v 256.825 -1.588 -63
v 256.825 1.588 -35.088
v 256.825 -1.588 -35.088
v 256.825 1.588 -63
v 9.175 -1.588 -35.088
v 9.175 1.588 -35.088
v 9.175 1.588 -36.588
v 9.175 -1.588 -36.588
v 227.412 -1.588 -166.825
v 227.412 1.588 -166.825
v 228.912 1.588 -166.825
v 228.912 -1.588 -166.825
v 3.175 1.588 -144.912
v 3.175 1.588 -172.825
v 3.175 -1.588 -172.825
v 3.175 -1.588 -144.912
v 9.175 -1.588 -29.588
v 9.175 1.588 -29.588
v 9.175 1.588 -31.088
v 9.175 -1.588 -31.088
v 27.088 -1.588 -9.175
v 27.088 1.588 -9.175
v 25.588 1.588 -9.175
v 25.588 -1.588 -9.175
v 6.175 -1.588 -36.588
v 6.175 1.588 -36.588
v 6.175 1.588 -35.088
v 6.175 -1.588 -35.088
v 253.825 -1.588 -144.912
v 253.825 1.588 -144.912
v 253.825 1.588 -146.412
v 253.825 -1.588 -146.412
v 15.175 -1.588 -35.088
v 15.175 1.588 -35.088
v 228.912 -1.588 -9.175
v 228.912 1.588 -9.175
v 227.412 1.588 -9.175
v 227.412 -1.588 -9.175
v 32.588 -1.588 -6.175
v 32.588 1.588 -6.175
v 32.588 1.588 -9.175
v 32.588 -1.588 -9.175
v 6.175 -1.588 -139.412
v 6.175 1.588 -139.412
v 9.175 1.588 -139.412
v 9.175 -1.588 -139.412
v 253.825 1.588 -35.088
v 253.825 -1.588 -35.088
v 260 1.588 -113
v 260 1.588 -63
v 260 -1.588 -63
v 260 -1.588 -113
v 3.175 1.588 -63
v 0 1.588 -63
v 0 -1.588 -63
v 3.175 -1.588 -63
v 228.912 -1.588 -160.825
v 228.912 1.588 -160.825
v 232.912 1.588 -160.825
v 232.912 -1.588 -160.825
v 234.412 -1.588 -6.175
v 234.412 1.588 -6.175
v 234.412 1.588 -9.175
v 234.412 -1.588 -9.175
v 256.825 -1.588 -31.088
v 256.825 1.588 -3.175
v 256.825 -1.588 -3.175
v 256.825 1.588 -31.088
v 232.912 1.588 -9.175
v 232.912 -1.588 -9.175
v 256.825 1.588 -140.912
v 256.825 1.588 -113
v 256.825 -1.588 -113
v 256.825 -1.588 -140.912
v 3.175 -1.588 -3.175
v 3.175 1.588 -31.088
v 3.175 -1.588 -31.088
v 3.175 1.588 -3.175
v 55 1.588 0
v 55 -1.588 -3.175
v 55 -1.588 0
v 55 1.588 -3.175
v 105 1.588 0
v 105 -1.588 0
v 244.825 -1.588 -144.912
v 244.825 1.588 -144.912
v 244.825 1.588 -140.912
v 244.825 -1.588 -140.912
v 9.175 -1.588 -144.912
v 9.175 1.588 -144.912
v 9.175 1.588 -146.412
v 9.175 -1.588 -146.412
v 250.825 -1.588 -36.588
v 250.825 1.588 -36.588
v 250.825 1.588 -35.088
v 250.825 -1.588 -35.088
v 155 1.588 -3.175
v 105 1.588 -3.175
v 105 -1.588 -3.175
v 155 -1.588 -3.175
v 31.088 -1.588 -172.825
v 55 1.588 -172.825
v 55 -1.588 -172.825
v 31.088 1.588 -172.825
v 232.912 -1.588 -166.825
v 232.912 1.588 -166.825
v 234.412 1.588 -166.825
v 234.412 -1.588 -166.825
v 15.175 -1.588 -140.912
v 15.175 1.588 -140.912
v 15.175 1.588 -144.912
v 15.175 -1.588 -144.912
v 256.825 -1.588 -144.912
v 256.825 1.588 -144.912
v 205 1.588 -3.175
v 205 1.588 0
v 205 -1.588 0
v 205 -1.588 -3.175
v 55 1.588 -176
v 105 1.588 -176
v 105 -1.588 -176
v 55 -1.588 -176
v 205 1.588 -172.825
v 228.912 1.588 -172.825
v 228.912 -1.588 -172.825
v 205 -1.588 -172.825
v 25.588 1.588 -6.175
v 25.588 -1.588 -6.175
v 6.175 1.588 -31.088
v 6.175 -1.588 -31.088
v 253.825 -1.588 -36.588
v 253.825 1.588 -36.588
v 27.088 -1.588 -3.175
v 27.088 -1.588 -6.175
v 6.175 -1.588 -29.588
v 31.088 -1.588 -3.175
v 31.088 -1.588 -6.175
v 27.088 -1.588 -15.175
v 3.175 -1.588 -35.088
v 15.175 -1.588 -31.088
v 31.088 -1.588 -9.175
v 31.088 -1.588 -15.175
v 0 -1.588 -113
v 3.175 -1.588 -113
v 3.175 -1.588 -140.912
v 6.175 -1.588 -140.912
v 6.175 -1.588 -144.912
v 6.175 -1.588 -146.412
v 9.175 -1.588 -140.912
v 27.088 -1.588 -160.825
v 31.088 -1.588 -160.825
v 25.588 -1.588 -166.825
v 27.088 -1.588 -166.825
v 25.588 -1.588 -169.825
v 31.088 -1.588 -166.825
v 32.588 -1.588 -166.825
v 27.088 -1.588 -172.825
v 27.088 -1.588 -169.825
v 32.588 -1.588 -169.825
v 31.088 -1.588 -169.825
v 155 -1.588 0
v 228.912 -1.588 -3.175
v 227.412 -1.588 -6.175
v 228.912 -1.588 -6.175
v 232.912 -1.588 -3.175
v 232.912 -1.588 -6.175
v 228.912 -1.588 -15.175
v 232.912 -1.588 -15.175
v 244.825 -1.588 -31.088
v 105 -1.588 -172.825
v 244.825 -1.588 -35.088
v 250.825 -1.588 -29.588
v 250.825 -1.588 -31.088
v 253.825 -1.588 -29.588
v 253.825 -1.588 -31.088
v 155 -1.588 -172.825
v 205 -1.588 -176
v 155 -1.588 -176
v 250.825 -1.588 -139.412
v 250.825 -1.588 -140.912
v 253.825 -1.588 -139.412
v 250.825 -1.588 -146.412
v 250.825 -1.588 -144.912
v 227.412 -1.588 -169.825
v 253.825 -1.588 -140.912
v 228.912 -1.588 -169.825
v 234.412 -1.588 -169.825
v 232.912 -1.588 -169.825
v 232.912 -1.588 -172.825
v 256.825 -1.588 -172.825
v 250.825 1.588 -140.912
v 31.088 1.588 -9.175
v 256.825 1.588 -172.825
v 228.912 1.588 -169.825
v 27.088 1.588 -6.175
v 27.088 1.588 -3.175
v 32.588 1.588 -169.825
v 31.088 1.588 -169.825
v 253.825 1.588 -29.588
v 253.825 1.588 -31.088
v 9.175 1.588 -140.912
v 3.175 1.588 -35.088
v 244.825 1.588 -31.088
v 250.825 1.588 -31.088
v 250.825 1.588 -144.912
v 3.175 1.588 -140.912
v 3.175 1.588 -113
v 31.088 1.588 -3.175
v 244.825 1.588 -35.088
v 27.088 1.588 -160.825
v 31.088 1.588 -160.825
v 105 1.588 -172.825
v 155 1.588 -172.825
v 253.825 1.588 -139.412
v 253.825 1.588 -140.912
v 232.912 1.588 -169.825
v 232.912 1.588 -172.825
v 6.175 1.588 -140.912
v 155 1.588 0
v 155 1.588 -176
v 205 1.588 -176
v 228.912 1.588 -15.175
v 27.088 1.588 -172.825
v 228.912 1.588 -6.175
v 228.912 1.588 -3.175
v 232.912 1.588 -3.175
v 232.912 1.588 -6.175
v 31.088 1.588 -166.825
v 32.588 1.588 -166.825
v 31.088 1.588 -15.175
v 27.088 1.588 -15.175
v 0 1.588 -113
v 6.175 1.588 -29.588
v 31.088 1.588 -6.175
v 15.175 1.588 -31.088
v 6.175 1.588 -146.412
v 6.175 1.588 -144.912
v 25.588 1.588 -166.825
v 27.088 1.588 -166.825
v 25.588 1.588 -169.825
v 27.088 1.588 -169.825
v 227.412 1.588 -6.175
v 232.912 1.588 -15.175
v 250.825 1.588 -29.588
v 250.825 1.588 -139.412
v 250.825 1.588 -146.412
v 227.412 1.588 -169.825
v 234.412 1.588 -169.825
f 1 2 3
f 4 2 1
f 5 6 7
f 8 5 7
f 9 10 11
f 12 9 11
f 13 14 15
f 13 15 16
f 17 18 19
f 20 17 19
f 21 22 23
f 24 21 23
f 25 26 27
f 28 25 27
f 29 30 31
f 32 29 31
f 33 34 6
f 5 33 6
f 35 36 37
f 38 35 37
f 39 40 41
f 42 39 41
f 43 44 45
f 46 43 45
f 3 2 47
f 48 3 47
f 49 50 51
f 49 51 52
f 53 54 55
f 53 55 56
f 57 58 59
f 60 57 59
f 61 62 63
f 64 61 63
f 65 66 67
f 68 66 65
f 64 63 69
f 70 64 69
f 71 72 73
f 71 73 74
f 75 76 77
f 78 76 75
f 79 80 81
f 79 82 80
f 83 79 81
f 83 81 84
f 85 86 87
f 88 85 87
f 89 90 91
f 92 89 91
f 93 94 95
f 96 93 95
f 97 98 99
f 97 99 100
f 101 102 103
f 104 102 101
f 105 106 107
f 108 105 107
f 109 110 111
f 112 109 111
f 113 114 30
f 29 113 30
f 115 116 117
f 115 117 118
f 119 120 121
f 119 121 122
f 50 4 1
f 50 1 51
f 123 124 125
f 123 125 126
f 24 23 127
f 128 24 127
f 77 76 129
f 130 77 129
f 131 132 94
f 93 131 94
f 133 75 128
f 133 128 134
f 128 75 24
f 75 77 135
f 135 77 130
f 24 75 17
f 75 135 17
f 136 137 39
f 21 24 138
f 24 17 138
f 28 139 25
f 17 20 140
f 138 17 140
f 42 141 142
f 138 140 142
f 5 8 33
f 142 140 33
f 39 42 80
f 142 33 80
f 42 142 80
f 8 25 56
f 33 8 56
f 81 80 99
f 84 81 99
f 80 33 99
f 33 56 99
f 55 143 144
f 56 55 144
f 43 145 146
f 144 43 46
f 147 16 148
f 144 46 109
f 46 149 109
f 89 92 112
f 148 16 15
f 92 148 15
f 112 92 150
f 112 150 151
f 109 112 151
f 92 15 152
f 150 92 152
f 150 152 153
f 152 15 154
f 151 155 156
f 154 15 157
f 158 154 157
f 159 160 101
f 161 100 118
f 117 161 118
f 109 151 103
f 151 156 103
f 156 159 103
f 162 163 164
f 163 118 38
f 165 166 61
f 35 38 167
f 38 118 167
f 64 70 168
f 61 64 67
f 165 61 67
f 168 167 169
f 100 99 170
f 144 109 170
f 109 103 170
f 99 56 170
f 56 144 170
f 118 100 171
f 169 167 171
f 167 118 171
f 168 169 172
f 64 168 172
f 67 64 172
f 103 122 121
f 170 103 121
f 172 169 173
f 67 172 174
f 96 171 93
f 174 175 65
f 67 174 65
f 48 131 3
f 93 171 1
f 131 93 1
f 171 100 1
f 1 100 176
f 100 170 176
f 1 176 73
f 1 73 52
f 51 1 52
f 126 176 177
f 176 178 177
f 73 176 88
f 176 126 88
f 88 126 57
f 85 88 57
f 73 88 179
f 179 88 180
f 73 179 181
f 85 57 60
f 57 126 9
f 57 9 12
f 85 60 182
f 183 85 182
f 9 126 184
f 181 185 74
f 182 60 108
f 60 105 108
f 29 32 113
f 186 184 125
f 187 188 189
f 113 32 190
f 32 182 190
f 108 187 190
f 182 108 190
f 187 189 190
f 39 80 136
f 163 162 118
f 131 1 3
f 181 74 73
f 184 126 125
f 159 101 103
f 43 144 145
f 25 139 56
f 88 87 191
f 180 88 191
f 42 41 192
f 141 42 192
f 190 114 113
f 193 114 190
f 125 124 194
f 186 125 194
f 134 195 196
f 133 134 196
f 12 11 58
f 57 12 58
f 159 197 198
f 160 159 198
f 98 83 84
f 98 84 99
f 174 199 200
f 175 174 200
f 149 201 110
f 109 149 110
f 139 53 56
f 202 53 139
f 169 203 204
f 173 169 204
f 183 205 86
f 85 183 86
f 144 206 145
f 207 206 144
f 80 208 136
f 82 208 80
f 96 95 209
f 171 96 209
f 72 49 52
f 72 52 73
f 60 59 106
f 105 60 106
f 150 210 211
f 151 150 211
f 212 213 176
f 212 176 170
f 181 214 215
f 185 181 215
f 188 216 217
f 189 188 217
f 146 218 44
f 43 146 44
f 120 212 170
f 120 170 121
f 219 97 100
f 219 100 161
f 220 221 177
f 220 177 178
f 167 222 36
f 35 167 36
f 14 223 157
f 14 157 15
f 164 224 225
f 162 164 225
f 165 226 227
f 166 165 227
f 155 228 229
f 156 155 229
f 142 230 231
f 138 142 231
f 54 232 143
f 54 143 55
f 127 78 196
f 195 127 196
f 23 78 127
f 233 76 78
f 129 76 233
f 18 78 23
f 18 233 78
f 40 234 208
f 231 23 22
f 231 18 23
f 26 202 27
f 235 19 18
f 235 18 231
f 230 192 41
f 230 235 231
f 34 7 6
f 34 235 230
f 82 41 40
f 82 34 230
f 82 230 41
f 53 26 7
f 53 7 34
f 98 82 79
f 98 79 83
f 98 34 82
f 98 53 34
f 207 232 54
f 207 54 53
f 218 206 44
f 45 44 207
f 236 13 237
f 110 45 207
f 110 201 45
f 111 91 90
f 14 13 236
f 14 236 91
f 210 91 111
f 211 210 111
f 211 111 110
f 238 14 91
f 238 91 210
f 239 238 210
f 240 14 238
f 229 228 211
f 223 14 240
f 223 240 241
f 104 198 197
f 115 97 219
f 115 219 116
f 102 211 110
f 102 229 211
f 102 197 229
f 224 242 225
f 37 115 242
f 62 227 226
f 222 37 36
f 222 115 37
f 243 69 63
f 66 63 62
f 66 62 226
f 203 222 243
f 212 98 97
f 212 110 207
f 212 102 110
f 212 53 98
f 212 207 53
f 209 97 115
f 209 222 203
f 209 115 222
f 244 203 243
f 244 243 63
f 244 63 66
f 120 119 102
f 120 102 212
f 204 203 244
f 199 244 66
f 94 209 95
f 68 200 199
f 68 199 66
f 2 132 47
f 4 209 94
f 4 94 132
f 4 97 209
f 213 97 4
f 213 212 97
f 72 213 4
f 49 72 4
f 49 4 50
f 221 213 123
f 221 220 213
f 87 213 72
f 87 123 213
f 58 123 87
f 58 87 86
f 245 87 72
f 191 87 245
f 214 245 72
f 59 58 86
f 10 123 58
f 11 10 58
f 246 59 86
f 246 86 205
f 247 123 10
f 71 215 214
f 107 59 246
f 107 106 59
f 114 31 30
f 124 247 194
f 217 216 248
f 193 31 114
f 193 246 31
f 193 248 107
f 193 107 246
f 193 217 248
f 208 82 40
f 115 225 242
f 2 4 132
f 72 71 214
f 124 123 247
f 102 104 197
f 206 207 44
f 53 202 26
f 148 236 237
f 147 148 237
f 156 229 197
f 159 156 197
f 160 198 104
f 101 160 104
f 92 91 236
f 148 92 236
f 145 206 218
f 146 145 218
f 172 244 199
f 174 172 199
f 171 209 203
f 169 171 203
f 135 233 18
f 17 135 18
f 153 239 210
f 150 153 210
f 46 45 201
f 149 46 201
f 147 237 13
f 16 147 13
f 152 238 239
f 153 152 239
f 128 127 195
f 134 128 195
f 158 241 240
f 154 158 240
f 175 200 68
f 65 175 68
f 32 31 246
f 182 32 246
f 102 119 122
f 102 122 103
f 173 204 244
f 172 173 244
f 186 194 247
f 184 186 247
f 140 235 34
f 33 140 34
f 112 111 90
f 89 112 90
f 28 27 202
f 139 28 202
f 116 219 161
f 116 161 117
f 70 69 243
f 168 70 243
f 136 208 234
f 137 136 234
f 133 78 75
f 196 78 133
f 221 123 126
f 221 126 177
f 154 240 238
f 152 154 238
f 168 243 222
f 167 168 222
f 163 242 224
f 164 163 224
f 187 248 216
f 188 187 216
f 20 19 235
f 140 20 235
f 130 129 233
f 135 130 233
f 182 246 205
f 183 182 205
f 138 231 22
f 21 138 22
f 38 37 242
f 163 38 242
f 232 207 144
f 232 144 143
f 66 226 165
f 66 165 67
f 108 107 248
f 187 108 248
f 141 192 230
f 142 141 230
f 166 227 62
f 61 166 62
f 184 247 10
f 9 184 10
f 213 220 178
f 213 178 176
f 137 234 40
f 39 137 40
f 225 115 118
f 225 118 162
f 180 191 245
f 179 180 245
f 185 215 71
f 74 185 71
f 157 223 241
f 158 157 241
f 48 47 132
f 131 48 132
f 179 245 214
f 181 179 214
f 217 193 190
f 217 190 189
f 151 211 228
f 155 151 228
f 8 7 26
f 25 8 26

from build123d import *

# Parameters (mm, degrees)
BOSS_EXTRUDE1_DEPTH     = 1.5875
CUT_EXTRUDE1_DEPTH      = 1
CUT_EXTRUDE1_DEPTH_BACK = 4.175


with BuildPart() as part:
    # Sketch1 → Boss-Extrude1 (new body, symmetric)
    with BuildSketch(Plane(origin=(0, 0, 0), x_dir=(1, 0, 0), z_dir=(0, 1, 0))):
        Polygon((55, 3.175), (55, 0), (105, 0), (105, 3.175), (155, 3.175), (155, 0), (205, 0), (205, 3.175), (256.825, 3.175), (256.825, 63), (260, 63), (260, 113), (256.825, 113), (256.825, 172.825), (205, 172.825), (205, 176), (155, 176), (155, 172.825), (105, 172.825), (105, 176), (55, 176), (55, 172.825), (3.175, 172.825), (3.175, 113), (0, 113), (0, 63), (3.175, 63), (3.175, 3.175), align=None)
    extrude(amount=BOSS_EXTRUDE1_DEPTH, both=True)

    # Sketch3 → Cut-Extrude1 (cut, two sides)
    with BuildSketch(Plane(origin=(0, 1.5875, 0), x_dir=(1, 0, 0), z_dir=(0, 1, 0))) as cut_extrude1_sk:
        Polygon((228.9125, 3.175), (232.9125, 3.175), (232.9125, 6.175), (234.4125, 6.175), (234.4125, 9.175), (232.9125, 9.175), (232.9125, 15.175), (228.9125, 15.175), (228.9125, 9.175), (227.4125, 9.175), (227.4125, 6.175), (228.9125, 6.175), align=None)
        Polygon((253.825, 31.0875), (256.825, 31.0875), (256.825, 35.0875), (253.825, 35.0875), (253.825, 36.5875), (250.825, 36.5875), (250.825, 35.0875), (244.825, 35.0875), (244.825, 31.0875), (250.825, 31.0875), (250.825, 29.5875), (253.825, 29.5875), align=None)
        Polygon((253.825, 140.9125), (256.825, 140.9125), (256.825, 144.9125), (253.825, 144.9125), (253.825, 146.4125), (250.825, 146.4125), (250.825, 144.9125), (244.825, 144.9125), (244.825, 140.9125), (250.825, 140.9125), (250.825, 139.4125), (253.825, 139.4125), align=None)
        Polygon((232.9125, 169.825), (232.9125, 172.825), (228.9125, 172.825), (228.9125, 169.825), (227.4125, 169.825), (227.4125, 166.825), (228.9125, 166.825), (228.9125, 160.825), (232.9125, 160.825), (232.9125, 166.825), (234.4125, 166.825), (234.4125, 169.825), align=None)
        Polygon((25.5875, 169.825), (25.5875, 166.825), (27.0875, 166.825), (27.0875, 160.825), (31.0875, 160.825), (31.0875, 166.825), (32.5875, 166.825), (32.5875, 169.825), (31.0875, 169.825), (31.0875, 172.825), (27.0875, 172.825), (27.0875, 169.825), align=None)
        Polygon((6.175, 144.9125), (3.175, 144.9125), (3.175, 140.9125), (6.175, 140.9125), (6.175, 139.4125), (9.175, 139.4125), (9.175, 140.9125), (15.175, 140.9125), (15.175, 144.9125), (9.175, 144.9125), (9.175, 146.4125), (6.175, 146.4125), align=None)
        Polygon((6.175, 35.0875), (3.175, 35.0875), (3.175, 31.0875), (6.175, 31.0875), (6.175, 29.5875), (9.175, 29.5875), (9.175, 31.0875), (15.175, 31.0875), (15.175, 35.0875), (9.175, 35.0875), (9.175, 36.5875), (6.175, 36.5875), align=None)
        Polygon((27.0875, 6.175), (27.0875, 3.175), (31.0875, 3.175), (31.0875, 6.175), (32.5875, 6.175), (32.5875, 9.175), (31.0875, 9.175), (31.0875, 15.175), (27.0875, 15.175), (27.0875, 9.175), (25.5875, 9.175), (25.5875, 6.175), align=None)
    extrude(amount=CUT_EXTRUDE1_DEPTH, mode=Mode.SUBTRACT)
    extrude(cut_extrude1_sk.sketch, amount=-CUT_EXTRUDE1_DEPTH_BACK, mode=Mode.SUBTRACT)


solid = part.part
